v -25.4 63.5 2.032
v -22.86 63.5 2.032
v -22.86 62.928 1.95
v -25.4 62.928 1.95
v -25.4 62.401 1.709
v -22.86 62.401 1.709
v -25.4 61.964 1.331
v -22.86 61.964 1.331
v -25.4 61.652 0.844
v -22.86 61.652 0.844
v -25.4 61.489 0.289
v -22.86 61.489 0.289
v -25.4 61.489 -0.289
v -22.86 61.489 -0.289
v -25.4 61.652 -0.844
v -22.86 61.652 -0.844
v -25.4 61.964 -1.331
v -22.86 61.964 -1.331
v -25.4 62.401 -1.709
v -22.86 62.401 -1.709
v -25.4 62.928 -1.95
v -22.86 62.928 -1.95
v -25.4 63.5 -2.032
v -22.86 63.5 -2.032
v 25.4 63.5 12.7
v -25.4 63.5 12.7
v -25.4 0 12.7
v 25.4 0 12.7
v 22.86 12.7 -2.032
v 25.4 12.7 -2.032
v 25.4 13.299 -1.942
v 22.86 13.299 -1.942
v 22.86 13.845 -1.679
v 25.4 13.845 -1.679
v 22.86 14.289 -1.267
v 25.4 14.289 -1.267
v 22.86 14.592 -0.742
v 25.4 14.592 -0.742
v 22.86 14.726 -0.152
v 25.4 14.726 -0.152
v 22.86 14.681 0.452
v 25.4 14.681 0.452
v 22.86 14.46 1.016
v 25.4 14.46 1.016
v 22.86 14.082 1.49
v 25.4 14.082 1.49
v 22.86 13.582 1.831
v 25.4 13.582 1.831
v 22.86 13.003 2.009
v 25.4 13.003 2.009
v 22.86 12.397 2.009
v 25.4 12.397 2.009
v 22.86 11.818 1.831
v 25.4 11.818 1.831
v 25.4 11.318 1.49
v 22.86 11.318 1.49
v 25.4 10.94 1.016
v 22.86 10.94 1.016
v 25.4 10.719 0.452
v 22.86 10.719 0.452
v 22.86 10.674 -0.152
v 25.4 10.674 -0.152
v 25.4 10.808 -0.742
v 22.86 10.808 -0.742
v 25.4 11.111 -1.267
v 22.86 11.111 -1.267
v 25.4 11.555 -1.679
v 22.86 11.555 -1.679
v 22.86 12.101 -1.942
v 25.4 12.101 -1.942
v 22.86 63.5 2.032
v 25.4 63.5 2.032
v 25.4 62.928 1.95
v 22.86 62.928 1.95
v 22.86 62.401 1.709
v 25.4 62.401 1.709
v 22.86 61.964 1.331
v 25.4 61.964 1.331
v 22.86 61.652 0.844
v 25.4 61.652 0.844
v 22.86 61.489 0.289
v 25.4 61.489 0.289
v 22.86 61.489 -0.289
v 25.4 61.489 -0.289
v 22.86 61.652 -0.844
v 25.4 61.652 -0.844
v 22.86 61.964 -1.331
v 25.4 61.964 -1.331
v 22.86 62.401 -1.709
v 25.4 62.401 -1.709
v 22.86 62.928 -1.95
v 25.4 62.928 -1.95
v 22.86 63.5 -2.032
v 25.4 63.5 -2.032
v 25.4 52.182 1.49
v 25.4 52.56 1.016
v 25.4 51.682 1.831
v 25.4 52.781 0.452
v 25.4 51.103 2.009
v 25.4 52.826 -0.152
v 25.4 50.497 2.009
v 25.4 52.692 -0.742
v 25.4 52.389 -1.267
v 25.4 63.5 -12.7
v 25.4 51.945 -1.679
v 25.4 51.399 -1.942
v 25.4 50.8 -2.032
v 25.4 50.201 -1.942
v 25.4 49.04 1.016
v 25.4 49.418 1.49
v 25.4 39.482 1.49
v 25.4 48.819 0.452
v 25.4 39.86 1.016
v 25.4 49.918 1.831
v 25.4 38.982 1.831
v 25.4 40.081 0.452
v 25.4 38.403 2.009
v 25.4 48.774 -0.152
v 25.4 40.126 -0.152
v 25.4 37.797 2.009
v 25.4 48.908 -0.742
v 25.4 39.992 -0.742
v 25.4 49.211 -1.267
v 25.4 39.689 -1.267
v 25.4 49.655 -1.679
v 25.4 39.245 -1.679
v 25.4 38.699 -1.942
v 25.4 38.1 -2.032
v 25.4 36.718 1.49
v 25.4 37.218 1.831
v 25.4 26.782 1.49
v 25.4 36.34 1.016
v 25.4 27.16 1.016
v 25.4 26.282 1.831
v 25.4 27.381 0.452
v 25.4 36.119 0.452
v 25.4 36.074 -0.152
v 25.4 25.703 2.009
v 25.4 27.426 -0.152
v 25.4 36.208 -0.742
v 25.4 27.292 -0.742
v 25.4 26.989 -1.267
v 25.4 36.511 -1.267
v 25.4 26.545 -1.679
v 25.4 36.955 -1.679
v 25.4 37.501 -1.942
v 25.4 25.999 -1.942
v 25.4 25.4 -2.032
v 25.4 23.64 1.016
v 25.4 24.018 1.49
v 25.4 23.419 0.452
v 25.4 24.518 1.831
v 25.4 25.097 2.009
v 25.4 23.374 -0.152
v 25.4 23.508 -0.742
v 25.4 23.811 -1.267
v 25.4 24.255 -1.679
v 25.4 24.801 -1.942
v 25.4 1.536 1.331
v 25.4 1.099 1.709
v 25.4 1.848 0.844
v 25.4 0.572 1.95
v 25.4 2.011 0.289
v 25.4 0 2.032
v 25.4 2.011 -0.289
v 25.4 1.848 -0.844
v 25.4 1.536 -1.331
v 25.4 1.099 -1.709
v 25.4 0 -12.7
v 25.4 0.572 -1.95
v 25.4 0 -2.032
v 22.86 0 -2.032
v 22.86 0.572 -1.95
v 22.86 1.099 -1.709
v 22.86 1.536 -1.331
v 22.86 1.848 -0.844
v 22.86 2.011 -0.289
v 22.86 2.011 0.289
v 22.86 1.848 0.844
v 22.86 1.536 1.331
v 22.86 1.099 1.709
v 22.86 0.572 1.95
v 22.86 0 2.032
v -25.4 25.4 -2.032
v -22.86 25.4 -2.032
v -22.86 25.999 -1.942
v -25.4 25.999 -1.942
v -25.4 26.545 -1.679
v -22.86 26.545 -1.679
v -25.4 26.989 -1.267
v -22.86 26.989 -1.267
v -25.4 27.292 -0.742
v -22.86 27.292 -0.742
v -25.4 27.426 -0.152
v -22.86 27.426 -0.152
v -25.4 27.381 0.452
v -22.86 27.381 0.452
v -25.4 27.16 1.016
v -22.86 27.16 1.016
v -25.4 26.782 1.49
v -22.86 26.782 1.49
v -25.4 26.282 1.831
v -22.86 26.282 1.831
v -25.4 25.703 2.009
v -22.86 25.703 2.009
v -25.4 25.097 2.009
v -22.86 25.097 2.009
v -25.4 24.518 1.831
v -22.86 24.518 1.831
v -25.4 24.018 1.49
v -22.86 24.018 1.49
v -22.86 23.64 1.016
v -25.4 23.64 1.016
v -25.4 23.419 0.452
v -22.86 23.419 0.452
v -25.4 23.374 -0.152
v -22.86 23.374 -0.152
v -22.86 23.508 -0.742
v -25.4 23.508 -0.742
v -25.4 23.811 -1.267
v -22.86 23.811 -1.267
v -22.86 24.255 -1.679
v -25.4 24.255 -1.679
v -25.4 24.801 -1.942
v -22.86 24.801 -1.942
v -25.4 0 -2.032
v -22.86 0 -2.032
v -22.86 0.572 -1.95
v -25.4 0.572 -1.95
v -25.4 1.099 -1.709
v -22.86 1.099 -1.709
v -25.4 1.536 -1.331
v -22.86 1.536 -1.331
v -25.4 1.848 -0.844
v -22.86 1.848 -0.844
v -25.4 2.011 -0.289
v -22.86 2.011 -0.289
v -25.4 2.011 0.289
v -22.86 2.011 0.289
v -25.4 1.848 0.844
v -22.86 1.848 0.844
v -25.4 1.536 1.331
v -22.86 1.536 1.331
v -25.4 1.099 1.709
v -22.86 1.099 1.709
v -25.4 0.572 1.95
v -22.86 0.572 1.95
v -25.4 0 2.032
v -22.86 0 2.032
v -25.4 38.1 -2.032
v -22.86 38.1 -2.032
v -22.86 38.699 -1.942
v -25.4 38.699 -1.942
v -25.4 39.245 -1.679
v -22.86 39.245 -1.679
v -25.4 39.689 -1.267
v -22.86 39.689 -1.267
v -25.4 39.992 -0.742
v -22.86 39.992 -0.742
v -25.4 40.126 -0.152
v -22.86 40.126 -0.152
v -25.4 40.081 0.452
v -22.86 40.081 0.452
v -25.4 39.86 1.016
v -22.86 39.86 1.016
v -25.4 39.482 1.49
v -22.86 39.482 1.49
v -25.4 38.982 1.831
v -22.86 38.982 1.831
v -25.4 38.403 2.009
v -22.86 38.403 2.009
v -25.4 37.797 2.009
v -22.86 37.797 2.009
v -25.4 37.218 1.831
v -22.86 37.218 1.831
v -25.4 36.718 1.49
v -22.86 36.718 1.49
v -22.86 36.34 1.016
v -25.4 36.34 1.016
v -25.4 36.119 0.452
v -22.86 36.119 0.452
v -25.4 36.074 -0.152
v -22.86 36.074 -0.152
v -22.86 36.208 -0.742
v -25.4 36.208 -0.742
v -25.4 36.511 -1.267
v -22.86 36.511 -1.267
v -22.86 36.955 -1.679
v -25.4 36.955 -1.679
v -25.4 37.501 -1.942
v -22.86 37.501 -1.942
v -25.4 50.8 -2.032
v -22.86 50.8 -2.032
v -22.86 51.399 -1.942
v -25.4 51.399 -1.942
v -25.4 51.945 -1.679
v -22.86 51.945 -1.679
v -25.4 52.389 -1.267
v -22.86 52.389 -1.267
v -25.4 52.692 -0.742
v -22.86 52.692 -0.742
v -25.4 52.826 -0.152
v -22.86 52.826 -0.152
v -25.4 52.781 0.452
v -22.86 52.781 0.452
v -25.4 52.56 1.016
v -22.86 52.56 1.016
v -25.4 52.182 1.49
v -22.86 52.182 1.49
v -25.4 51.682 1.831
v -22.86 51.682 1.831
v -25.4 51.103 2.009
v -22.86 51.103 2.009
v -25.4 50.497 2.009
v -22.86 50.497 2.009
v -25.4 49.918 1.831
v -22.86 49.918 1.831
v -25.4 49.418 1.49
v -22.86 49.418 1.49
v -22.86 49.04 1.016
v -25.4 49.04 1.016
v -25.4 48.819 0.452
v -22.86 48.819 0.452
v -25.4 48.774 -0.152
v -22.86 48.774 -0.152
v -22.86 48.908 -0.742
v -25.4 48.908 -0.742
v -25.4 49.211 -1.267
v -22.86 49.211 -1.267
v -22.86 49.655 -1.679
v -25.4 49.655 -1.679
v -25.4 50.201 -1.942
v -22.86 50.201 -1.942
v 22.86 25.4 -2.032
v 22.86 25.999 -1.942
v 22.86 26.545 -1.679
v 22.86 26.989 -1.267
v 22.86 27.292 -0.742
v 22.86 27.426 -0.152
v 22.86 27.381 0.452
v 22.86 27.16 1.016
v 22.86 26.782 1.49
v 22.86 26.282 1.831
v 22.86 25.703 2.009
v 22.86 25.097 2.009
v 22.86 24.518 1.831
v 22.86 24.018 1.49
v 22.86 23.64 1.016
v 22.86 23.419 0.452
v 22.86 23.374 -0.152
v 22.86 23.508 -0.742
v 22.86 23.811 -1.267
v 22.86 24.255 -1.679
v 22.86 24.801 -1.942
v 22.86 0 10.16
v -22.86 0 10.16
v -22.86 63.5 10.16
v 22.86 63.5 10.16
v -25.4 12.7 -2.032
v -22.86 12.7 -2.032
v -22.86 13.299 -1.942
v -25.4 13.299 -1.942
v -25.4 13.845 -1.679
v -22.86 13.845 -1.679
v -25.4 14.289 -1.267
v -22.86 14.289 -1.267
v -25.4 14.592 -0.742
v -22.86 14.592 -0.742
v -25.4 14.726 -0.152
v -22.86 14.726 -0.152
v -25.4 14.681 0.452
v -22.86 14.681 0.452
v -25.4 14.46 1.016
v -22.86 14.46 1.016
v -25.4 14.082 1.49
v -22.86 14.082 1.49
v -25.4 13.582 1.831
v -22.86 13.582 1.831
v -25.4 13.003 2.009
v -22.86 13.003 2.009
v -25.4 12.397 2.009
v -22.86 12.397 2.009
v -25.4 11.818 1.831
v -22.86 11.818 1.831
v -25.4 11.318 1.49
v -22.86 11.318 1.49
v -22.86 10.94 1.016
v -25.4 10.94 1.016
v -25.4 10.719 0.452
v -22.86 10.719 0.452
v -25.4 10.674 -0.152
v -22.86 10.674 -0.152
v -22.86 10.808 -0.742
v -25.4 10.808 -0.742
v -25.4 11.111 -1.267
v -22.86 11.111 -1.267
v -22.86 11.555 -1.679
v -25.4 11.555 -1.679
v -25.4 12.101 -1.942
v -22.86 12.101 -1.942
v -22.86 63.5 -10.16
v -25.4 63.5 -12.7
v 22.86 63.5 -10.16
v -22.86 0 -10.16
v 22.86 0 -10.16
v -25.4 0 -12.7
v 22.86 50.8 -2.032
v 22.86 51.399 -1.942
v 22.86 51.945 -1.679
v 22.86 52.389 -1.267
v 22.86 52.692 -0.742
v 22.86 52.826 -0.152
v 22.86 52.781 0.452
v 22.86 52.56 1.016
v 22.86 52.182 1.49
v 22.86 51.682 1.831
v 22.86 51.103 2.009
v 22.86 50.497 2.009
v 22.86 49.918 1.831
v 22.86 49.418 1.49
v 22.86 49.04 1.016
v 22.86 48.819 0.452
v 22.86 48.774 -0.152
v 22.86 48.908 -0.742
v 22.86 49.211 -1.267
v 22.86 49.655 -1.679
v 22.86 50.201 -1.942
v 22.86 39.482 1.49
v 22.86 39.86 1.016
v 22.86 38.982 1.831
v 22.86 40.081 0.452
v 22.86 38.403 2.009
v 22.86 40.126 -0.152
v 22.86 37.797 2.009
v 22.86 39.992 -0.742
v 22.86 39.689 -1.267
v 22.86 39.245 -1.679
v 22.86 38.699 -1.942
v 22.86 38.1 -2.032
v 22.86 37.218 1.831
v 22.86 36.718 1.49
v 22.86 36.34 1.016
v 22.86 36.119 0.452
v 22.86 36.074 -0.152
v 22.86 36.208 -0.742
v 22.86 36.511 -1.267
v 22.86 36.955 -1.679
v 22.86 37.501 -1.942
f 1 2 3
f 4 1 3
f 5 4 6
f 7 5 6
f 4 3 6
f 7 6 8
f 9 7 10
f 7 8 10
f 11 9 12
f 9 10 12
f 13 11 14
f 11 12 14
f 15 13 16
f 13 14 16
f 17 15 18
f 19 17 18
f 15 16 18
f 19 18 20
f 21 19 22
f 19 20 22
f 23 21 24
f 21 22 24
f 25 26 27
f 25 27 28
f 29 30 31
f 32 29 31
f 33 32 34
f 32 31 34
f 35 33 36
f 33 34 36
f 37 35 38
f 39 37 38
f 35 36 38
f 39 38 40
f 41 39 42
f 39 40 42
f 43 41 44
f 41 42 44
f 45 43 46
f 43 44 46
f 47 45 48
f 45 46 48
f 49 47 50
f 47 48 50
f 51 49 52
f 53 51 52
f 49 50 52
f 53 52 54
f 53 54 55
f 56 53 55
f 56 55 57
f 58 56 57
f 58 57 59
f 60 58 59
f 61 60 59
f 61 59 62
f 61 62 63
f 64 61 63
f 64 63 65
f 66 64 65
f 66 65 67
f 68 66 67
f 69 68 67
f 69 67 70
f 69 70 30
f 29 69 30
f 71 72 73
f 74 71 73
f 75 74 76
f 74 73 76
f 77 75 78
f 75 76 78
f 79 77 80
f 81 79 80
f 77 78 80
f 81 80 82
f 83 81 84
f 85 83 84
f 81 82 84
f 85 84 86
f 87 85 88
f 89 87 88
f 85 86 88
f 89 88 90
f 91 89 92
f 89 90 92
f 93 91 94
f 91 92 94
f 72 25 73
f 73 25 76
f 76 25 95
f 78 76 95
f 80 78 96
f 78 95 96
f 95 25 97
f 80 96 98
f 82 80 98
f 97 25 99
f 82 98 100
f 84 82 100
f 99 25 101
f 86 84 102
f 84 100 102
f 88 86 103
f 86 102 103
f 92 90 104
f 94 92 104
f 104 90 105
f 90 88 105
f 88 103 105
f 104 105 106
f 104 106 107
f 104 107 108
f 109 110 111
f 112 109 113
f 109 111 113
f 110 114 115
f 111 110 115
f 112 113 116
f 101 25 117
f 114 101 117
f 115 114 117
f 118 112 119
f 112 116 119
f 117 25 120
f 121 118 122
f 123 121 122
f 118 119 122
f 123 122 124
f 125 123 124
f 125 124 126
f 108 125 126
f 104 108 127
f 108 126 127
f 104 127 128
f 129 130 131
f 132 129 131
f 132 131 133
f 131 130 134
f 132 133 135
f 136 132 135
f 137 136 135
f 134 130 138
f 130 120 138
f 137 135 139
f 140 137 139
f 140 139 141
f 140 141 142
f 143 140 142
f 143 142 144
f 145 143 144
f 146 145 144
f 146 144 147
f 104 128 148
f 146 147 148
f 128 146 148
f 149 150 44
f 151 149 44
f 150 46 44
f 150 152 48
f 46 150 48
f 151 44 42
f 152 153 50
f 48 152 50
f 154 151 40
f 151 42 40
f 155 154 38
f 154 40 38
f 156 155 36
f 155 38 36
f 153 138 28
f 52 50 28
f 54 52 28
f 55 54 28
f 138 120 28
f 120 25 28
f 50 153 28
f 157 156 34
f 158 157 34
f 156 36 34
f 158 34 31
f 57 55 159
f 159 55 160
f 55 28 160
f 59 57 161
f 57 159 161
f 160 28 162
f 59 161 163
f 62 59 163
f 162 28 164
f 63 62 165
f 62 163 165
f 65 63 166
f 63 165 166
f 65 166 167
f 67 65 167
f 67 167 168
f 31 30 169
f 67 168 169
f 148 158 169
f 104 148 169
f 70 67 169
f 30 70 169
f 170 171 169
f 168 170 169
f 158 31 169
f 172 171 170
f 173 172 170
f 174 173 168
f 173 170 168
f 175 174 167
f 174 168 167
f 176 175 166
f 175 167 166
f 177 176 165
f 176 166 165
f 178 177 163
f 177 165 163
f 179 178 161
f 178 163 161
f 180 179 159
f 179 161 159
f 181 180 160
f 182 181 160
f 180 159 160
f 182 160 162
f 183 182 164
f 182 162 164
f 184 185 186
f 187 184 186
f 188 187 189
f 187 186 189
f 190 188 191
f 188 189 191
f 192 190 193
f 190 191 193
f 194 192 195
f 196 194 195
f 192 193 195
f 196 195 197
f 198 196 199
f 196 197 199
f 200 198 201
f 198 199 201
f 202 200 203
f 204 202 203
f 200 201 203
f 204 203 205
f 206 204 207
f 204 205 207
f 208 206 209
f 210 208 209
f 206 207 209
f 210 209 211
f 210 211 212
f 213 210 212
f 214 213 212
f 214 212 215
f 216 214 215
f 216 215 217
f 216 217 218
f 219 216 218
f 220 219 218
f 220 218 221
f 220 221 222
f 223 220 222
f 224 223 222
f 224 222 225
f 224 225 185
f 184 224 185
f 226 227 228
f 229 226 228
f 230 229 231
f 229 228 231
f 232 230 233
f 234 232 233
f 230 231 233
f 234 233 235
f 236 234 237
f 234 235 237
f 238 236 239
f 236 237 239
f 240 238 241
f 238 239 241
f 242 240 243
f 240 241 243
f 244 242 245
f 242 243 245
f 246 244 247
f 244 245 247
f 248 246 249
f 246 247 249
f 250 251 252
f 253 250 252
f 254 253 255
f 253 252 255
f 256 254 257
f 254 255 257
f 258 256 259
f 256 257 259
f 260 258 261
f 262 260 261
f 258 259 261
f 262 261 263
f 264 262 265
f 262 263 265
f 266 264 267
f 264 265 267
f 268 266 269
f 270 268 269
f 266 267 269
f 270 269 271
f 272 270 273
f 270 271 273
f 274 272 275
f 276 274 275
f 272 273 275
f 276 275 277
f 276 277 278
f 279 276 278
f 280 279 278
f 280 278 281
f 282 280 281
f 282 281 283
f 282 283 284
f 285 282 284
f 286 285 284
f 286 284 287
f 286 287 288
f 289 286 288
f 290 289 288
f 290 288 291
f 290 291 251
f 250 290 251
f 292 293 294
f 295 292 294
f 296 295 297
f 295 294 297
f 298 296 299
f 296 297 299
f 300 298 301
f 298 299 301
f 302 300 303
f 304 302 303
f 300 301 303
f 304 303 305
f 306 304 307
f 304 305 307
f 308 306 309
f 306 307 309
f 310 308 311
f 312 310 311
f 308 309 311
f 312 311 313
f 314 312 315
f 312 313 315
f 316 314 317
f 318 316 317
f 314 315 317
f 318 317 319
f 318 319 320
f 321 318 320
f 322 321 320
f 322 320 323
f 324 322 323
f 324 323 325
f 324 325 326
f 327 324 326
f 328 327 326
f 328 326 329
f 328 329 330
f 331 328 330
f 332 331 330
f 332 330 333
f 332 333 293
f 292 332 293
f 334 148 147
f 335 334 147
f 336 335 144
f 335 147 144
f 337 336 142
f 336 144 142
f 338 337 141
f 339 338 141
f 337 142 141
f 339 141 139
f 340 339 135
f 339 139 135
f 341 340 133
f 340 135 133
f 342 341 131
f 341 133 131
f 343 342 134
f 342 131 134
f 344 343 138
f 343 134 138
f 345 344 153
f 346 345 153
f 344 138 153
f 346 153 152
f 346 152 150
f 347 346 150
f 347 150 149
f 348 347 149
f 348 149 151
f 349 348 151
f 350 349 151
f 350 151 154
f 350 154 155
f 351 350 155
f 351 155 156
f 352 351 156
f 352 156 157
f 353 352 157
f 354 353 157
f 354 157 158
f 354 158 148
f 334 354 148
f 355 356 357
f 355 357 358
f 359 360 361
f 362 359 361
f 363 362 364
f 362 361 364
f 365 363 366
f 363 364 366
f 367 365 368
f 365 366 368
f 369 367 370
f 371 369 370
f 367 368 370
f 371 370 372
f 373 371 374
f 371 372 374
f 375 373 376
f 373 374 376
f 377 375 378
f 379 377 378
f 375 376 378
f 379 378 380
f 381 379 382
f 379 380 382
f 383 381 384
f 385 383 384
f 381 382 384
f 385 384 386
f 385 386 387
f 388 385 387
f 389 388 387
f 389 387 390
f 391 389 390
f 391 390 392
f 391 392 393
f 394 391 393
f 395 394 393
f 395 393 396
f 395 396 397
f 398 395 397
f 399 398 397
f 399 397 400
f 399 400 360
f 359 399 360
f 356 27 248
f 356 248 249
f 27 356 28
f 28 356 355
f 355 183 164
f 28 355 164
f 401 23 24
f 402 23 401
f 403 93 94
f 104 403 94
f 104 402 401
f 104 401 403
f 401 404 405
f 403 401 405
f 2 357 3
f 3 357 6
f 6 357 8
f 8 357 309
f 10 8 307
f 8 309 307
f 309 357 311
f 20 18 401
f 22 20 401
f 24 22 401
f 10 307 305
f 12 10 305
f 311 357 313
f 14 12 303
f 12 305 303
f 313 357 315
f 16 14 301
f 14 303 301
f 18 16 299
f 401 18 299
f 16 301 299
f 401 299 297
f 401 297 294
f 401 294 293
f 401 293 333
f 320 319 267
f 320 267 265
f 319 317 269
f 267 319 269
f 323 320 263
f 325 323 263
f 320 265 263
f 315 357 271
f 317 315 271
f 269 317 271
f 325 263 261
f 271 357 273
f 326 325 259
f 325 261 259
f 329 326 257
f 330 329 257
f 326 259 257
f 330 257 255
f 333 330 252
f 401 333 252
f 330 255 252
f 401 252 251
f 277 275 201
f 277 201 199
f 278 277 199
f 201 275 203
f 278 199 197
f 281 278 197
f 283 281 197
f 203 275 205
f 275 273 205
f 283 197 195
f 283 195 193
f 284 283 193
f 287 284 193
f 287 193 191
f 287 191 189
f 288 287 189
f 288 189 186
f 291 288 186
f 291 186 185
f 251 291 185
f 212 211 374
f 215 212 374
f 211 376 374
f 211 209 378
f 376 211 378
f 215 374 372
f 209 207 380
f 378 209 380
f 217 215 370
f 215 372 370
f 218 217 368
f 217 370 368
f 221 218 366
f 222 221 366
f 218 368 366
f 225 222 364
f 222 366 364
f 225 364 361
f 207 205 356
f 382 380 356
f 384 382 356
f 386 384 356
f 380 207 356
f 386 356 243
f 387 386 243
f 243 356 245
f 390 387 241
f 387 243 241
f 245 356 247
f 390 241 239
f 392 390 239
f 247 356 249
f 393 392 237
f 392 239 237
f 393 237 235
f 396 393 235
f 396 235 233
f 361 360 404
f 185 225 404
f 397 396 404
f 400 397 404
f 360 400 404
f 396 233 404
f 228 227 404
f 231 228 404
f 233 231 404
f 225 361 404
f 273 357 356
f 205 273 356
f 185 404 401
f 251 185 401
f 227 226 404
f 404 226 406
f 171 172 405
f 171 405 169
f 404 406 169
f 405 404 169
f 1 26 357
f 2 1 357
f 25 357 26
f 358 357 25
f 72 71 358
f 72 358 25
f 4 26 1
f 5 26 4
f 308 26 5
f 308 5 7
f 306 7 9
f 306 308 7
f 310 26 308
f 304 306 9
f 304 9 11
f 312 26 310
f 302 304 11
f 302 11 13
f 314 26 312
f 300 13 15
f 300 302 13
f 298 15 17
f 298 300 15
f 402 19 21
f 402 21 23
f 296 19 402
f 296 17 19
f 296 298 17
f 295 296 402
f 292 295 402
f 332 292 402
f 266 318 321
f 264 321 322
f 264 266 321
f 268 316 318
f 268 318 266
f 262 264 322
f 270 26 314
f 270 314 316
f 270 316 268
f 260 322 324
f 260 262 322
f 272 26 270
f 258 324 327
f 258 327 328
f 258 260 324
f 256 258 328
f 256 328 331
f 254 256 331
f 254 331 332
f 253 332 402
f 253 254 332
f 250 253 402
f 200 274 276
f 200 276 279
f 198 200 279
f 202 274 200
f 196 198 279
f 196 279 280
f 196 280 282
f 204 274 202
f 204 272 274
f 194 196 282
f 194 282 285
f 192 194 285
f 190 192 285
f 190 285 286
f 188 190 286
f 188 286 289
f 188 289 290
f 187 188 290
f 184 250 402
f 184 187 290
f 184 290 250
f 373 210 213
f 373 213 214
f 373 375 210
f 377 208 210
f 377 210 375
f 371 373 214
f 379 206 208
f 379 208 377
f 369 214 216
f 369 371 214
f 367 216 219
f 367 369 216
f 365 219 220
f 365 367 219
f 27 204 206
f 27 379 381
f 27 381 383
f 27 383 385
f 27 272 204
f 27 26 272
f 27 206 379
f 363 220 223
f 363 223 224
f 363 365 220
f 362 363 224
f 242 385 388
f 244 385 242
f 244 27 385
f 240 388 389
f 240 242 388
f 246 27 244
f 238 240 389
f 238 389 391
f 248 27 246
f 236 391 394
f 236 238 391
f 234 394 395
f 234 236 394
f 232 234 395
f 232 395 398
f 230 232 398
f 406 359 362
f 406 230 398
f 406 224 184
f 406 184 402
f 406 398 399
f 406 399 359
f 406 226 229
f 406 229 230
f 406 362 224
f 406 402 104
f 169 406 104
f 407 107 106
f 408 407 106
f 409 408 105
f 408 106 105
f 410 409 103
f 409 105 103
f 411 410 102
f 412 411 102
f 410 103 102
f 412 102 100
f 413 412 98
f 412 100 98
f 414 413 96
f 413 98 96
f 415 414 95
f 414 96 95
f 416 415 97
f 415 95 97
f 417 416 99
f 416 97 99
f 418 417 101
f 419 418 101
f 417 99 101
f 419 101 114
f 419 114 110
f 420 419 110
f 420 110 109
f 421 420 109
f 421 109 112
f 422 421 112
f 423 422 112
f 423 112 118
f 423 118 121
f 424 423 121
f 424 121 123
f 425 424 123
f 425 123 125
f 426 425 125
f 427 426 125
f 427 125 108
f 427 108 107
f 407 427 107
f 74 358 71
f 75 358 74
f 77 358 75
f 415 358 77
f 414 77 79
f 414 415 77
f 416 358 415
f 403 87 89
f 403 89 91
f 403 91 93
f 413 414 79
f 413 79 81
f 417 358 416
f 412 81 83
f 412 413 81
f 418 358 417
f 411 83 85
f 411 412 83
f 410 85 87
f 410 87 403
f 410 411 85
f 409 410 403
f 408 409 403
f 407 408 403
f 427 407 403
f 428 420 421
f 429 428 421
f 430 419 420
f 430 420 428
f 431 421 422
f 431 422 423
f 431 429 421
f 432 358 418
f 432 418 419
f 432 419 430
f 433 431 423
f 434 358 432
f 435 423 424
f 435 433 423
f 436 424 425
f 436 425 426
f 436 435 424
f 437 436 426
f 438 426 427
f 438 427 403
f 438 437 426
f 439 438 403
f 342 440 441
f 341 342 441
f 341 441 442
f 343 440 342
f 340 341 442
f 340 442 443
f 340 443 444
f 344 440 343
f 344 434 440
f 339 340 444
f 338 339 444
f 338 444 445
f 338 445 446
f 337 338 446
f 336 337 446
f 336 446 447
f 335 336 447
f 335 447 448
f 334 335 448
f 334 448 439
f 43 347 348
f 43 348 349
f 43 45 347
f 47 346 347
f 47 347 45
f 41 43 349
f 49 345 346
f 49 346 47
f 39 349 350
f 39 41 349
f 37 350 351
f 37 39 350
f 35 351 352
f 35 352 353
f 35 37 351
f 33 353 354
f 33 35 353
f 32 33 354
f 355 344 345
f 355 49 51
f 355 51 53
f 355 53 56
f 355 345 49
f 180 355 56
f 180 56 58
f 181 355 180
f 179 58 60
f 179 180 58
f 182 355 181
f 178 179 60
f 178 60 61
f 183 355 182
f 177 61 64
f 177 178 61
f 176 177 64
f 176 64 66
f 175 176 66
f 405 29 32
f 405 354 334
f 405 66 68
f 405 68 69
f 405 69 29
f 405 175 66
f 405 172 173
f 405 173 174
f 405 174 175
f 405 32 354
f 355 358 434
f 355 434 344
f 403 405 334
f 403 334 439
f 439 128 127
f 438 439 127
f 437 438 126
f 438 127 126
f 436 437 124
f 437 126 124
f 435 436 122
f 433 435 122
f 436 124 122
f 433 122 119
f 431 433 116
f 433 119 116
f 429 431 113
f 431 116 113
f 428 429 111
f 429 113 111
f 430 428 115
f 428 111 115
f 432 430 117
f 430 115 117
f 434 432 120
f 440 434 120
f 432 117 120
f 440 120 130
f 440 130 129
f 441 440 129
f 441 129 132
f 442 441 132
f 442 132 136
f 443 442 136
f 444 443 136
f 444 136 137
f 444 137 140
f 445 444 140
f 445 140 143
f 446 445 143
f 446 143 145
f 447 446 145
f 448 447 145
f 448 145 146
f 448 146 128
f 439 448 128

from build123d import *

# Parameters (mm, degrees)
SKETCH2_W           = 50.8
SKETCH2_H           = 25.4
SKETCH2_W_2         = 45.72
SKETCH2_H_2         = 20.32
BOSS_EXTRUDE1_DEPTH = 635
SKETCH3_R           = 2.032
CUT_EXTRUDE1_DEPTH  = 638.155342126
SKETCH6_W           = 50.8
SKETCH6_H           = 25.4
CUT_EXTRUDE4_DEPTH  = 571.5


with BuildPart() as part:
    # Sketch2 → Boss-Extrude1 (new body)
    with BuildSketch(Plane(origin=(0, 0, 0), x_dir=(1, 0, 0), z_dir=(0, 1, 0))):
        Rectangle(SKETCH2_W, SKETCH2_H)
        Rectangle(SKETCH2_W_2, SKETCH2_H_2, mode=Mode.SUBTRACT)
    extrude(amount=BOSS_EXTRUDE1_DEPTH)

    # Sketch3 → Cut-Extrude1 (cut, through all)
    with BuildSketch(Plane(origin=(25.4, 0, 0), x_dir=(0, 0, -1), z_dir=(1, 0, 0))):
        Circle(SKETCH3_R)
        with Locations((0, 12.7)):
            Circle(SKETCH3_R)
        with Locations((0, 25.4)):
            Circle(SKETCH3_R)
        with Locations((0, 38.1)):
            Circle(SKETCH3_R)
        with Locations((0, 50.8)):
            Circle(SKETCH3_R)
        with Locations((0, 63.5)):
            Circle(SKETCH3_R)
        with Locations((0, 76.2)):
            Circle(SKETCH3_R)
        with Locations((0, 88.9)):
            Circle(SKETCH3_R)
        with Locations((0, 101.6)):
            Circle(SKETCH3_R)
        with Locations((0, 114.3)):
            Circle(SKETCH3_R)
        with Locations((0, 127)):
            Circle(SKETCH3_R)
        with Locations((0, 139.7)):
            Circle(SKETCH3_R)
        with Locations((0, 152.4)):
            Circle(SKETCH3_R)
        with Locations((0, 165.1)):
            Circle(SKETCH3_R)
        with Locations((0, 177.8)):
            Circle(SKETCH3_R)
        with Locations((0, 190.5)):
            Circle(SKETCH3_R)
        with Locations((0, 203.2)):
            Circle(SKETCH3_R)
        with Locations((0, 215.9)):
            Circle(SKETCH3_R)
        with Locations((0, 228.6)):
            Circle(SKETCH3_R)
        with Locations((0, 241.3)):
            Circle(SKETCH3_R)
        with Locations((0, 254)):
            Circle(SKETCH3_R)
        with Locations((0, 266.7)):
            Circle(SKETCH3_R)
        with Locations((0, 279.4)):
            Circle(SKETCH3_R)
        with Locations((0, 292.1)):
            Circle(SKETCH3_R)
        with Locations((0, 304.8)):
            Circle(SKETCH3_R)
        with Locations((0, 317.5)):
            Circle(SKETCH3_R)
        with Locations((0, 330.2)):
            Circle(SKETCH3_R)
        with Locations((0, 342.9)):
            Circle(SKETCH3_R)
        with Locations((0, 355.6)):
            Circle(SKETCH3_R)
        with Locations((0, 368.3)):
            Circle(SKETCH3_R)
        with Locations((0, 381)):
            Circle(SKETCH3_R)
        with Locations((0, 393.7)):
            Circle(SKETCH3_R)
        with Locations((0, 406.4)):
            Circle(SKETCH3_R)
        with Locations((0, 419.1)):
            Circle(SKETCH3_R)
        with Locations((0, 431.8)):
            Circle(SKETCH3_R)
        with Locations((0, 444.5)):
            Circle(SKETCH3_R)
        with Locations((0, 457.2)):
            Circle(SKETCH3_R)
        with Locations((0, 469.9)):
            Circle(SKETCH3_R)
        with Locations((0, 482.6)):
            Circle(SKETCH3_R)
        with Locations((0, 495.3)):
            Circle(SKETCH3_R)
        with Locations((0, 508)):
            Circle(SKETCH3_R)
        with Locations((0, 520.7)):
            Circle(SKETCH3_R)
        with Locations((0, 533.4)):
            Circle(SKETCH3_R)
        with Locations((0, 546.1)):
            Circle(SKETCH3_R)
        with Locations((0, 558.8)):
            Circle(SKETCH3_R)
        with Locations((0, 571.5)):
            Circle(SKETCH3_R)
        with Locations((0, 584.2)):
            Circle(SKETCH3_R)
        with Locations((0, 596.9)):
            Circle(SKETCH3_R)
        with Locations((0, 609.6)):
            Circle(SKETCH3_R)
        with Locations((0, 622.3)):
            Circle(SKETCH3_R)
    extrude(amount=-CUT_EXTRUDE1_DEPTH, mode=Mode.SUBTRACT)

    # Sketch6 → Cut-Extrude4 (cut)
    with BuildSketch(Plane(origin=(0, 635, 0), x_dir=(1, 0, 0), z_dir=(0, 1, 0))):
        Rectangle(SKETCH6_W, SKETCH6_H)
    extrude(amount=-CUT_EXTRUDE4_DEPTH, mode=Mode.SUBTRACT)


solid = part.part
